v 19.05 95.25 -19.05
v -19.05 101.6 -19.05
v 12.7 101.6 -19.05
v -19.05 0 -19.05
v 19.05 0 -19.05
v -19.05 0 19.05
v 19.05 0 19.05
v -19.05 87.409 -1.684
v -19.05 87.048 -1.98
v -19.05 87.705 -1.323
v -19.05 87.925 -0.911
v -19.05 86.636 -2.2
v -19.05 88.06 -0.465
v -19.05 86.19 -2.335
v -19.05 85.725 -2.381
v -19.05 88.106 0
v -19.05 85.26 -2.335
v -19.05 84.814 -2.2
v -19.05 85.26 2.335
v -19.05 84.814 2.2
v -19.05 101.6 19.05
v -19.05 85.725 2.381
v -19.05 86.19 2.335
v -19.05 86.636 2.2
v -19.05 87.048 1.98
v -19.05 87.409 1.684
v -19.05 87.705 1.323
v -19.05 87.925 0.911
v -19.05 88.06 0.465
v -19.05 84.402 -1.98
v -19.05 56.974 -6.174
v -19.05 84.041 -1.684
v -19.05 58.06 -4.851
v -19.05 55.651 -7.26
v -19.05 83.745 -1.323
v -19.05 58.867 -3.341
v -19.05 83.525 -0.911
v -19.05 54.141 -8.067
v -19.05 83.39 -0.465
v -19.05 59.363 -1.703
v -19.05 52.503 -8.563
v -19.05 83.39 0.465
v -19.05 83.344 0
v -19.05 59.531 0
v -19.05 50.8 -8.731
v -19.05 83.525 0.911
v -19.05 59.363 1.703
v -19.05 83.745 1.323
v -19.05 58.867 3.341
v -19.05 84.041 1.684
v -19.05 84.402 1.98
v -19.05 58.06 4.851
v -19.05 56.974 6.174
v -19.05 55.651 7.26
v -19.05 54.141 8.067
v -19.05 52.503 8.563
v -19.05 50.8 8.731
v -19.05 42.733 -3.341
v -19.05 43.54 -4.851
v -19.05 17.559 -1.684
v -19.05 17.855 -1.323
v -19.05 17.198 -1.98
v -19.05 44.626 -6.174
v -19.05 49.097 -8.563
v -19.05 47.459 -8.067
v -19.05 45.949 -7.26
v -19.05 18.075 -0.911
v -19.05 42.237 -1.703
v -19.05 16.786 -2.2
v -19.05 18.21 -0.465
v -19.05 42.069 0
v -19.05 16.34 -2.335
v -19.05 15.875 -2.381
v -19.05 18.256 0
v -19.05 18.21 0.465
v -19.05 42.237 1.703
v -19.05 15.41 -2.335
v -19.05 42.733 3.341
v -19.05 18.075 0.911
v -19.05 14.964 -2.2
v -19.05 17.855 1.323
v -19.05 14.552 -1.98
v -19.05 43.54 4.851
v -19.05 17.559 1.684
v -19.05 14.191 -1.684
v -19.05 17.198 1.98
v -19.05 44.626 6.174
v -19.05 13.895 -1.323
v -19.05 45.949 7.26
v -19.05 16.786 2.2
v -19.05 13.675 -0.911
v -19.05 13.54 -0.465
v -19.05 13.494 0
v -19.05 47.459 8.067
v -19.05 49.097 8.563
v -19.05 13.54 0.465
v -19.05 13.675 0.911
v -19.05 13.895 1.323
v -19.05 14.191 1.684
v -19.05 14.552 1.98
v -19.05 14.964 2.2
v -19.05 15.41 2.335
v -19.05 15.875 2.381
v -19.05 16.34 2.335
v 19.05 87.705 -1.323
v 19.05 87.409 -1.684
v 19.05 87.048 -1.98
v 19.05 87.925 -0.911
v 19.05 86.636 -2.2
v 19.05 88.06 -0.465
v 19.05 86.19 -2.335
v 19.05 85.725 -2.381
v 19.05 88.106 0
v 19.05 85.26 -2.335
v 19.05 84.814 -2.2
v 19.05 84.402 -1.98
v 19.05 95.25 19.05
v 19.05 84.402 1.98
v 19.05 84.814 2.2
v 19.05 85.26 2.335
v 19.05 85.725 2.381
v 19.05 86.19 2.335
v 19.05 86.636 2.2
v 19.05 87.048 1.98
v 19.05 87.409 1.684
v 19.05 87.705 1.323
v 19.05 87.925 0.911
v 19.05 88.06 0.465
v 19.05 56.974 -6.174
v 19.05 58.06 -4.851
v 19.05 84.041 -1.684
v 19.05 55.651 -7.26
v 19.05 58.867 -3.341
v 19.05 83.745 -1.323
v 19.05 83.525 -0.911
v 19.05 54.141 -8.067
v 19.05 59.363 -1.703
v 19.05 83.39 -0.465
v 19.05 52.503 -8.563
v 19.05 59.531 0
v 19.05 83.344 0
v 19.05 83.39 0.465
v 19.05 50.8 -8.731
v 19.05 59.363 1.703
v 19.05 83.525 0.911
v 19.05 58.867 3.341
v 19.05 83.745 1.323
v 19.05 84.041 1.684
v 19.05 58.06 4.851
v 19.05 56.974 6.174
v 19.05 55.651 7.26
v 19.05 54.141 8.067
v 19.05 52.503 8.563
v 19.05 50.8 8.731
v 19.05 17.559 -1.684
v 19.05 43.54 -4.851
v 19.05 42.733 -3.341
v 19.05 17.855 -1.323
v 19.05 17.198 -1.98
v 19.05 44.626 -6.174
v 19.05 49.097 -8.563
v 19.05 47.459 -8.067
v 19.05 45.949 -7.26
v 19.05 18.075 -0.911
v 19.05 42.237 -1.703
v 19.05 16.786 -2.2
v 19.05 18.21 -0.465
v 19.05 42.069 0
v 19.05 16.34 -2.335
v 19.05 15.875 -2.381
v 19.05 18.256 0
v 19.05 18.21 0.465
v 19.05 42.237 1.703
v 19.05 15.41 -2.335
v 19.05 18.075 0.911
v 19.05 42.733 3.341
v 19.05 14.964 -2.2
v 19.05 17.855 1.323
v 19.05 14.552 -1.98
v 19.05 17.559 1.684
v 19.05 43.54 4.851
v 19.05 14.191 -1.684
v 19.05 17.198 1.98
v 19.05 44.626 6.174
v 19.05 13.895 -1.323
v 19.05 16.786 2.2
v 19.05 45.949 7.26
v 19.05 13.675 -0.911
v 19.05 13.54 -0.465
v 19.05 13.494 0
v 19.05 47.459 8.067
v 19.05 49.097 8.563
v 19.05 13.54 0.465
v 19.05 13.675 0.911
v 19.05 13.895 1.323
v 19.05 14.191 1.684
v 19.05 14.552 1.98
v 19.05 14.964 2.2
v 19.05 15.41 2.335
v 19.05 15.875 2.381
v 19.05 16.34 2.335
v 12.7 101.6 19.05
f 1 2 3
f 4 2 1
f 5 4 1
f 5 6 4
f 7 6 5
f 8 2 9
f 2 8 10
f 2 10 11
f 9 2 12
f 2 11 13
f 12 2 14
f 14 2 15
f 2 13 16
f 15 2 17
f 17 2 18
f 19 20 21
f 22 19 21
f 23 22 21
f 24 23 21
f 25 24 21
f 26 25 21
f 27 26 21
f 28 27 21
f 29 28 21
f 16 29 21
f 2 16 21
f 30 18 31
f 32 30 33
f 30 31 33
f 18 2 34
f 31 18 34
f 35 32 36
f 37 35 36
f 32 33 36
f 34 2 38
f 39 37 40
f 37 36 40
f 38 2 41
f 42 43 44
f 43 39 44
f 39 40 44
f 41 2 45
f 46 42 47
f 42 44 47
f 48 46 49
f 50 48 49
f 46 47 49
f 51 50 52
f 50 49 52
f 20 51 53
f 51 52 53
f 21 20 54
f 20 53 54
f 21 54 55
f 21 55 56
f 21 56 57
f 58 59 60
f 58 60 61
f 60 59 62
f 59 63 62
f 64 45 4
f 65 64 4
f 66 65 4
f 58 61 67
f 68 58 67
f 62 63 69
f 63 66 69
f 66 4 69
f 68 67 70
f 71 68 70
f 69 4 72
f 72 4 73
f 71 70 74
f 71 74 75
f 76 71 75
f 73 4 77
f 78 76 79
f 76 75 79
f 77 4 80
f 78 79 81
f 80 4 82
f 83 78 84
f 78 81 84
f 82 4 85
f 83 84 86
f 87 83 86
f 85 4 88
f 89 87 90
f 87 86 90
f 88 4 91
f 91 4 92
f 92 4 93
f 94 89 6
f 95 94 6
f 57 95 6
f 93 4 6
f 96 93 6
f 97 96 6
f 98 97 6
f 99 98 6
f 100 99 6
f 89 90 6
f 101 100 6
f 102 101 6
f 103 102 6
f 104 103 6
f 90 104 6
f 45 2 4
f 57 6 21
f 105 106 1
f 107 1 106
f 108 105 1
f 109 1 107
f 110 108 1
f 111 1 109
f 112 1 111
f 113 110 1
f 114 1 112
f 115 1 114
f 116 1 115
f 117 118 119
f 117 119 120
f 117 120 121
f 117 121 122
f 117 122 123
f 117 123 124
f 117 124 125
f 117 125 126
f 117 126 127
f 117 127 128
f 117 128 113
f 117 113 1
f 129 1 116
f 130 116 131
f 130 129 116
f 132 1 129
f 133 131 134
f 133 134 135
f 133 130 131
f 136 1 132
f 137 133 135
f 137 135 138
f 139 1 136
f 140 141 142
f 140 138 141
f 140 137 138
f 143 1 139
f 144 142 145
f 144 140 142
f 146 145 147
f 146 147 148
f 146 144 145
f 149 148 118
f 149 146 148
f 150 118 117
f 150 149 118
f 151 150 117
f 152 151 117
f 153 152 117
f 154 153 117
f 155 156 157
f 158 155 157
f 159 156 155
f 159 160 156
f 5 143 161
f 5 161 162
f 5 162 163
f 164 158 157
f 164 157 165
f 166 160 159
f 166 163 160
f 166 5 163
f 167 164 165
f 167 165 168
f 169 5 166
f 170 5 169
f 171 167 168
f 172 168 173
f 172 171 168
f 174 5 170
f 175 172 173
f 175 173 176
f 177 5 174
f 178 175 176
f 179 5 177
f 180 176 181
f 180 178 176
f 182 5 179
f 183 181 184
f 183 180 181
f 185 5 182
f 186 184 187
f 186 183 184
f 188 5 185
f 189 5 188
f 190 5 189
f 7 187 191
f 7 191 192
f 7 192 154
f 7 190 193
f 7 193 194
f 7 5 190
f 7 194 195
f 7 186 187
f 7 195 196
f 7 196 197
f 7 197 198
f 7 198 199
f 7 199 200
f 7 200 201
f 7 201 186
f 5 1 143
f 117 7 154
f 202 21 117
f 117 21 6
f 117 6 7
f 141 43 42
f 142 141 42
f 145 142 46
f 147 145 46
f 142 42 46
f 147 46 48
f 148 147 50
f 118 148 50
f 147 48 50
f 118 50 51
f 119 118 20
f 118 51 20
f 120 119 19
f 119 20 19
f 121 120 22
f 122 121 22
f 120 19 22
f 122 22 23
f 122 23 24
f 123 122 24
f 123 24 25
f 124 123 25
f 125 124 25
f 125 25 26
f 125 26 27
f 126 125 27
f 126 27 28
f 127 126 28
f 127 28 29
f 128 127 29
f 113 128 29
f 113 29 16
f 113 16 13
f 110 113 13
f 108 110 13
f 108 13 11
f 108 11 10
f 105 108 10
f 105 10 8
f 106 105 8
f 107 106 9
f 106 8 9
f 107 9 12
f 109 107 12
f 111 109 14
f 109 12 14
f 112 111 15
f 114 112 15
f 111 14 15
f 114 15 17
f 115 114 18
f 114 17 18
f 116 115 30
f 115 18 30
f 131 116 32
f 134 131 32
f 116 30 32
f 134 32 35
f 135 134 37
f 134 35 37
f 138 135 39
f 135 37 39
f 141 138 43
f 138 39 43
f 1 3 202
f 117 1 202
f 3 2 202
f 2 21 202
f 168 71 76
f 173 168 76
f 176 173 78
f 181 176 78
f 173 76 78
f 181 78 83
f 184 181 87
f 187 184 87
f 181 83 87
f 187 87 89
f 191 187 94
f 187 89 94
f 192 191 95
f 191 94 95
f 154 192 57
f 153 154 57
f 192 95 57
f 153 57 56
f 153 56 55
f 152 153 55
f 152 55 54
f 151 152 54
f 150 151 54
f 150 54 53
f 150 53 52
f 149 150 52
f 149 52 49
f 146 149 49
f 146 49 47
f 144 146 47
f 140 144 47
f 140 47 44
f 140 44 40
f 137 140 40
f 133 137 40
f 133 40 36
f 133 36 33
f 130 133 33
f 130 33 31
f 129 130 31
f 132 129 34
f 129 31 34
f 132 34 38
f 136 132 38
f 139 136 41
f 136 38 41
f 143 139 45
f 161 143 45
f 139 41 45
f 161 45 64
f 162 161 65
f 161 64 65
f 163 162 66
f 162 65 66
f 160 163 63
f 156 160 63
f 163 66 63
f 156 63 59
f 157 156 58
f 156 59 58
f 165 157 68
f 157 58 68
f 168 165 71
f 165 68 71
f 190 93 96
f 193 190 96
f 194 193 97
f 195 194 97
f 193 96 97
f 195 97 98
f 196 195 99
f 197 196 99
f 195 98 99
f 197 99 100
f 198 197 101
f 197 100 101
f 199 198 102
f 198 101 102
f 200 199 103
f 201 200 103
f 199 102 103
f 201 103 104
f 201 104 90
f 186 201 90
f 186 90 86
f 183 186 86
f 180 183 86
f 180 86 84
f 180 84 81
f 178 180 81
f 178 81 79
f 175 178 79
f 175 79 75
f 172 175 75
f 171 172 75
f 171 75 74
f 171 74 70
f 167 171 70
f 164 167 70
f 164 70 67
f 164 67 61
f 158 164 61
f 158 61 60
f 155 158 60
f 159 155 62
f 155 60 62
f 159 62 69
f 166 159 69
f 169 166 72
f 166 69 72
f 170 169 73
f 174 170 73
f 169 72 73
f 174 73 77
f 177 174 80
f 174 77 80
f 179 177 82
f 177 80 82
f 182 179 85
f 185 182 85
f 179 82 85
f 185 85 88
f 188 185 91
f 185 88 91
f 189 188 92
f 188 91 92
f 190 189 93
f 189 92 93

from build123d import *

# Parameters (mm, degrees)
F0_W     = 38.1
F0_H     = 38.1
F1_DEPTH = 101.6
F2_SIZE  = 6.35
F4_D     = 17.4625
F5_D     = 4.7625


with BuildPart() as f1:
    # F0 (on Front) → F1 (new body)
    with BuildSketch(Plane.XZ):
        Rectangle(F0_W, F0_H)
    extrude(amount=-F1_DEPTH)

    # F2
    f2_edges = [f1.edges().sort_by_distance(p)[0] for p in [
        (19.05, 101.6, 0),
    ]]
    chamfer(f2_edges, length=F2_SIZE)

    # F4 (through all)
    with Locations(Plane.YZ.offset(19.05)):
        with Locations((50.8, 0)):
            Hole(F4_D / 2)

    # F5 (through all)
    with Locations(Plane.YZ.offset(19.05)):
        with Locations((15.875, 0), (85.725, 0)):
            Hole(F5_D / 2)


solid = f1.part
